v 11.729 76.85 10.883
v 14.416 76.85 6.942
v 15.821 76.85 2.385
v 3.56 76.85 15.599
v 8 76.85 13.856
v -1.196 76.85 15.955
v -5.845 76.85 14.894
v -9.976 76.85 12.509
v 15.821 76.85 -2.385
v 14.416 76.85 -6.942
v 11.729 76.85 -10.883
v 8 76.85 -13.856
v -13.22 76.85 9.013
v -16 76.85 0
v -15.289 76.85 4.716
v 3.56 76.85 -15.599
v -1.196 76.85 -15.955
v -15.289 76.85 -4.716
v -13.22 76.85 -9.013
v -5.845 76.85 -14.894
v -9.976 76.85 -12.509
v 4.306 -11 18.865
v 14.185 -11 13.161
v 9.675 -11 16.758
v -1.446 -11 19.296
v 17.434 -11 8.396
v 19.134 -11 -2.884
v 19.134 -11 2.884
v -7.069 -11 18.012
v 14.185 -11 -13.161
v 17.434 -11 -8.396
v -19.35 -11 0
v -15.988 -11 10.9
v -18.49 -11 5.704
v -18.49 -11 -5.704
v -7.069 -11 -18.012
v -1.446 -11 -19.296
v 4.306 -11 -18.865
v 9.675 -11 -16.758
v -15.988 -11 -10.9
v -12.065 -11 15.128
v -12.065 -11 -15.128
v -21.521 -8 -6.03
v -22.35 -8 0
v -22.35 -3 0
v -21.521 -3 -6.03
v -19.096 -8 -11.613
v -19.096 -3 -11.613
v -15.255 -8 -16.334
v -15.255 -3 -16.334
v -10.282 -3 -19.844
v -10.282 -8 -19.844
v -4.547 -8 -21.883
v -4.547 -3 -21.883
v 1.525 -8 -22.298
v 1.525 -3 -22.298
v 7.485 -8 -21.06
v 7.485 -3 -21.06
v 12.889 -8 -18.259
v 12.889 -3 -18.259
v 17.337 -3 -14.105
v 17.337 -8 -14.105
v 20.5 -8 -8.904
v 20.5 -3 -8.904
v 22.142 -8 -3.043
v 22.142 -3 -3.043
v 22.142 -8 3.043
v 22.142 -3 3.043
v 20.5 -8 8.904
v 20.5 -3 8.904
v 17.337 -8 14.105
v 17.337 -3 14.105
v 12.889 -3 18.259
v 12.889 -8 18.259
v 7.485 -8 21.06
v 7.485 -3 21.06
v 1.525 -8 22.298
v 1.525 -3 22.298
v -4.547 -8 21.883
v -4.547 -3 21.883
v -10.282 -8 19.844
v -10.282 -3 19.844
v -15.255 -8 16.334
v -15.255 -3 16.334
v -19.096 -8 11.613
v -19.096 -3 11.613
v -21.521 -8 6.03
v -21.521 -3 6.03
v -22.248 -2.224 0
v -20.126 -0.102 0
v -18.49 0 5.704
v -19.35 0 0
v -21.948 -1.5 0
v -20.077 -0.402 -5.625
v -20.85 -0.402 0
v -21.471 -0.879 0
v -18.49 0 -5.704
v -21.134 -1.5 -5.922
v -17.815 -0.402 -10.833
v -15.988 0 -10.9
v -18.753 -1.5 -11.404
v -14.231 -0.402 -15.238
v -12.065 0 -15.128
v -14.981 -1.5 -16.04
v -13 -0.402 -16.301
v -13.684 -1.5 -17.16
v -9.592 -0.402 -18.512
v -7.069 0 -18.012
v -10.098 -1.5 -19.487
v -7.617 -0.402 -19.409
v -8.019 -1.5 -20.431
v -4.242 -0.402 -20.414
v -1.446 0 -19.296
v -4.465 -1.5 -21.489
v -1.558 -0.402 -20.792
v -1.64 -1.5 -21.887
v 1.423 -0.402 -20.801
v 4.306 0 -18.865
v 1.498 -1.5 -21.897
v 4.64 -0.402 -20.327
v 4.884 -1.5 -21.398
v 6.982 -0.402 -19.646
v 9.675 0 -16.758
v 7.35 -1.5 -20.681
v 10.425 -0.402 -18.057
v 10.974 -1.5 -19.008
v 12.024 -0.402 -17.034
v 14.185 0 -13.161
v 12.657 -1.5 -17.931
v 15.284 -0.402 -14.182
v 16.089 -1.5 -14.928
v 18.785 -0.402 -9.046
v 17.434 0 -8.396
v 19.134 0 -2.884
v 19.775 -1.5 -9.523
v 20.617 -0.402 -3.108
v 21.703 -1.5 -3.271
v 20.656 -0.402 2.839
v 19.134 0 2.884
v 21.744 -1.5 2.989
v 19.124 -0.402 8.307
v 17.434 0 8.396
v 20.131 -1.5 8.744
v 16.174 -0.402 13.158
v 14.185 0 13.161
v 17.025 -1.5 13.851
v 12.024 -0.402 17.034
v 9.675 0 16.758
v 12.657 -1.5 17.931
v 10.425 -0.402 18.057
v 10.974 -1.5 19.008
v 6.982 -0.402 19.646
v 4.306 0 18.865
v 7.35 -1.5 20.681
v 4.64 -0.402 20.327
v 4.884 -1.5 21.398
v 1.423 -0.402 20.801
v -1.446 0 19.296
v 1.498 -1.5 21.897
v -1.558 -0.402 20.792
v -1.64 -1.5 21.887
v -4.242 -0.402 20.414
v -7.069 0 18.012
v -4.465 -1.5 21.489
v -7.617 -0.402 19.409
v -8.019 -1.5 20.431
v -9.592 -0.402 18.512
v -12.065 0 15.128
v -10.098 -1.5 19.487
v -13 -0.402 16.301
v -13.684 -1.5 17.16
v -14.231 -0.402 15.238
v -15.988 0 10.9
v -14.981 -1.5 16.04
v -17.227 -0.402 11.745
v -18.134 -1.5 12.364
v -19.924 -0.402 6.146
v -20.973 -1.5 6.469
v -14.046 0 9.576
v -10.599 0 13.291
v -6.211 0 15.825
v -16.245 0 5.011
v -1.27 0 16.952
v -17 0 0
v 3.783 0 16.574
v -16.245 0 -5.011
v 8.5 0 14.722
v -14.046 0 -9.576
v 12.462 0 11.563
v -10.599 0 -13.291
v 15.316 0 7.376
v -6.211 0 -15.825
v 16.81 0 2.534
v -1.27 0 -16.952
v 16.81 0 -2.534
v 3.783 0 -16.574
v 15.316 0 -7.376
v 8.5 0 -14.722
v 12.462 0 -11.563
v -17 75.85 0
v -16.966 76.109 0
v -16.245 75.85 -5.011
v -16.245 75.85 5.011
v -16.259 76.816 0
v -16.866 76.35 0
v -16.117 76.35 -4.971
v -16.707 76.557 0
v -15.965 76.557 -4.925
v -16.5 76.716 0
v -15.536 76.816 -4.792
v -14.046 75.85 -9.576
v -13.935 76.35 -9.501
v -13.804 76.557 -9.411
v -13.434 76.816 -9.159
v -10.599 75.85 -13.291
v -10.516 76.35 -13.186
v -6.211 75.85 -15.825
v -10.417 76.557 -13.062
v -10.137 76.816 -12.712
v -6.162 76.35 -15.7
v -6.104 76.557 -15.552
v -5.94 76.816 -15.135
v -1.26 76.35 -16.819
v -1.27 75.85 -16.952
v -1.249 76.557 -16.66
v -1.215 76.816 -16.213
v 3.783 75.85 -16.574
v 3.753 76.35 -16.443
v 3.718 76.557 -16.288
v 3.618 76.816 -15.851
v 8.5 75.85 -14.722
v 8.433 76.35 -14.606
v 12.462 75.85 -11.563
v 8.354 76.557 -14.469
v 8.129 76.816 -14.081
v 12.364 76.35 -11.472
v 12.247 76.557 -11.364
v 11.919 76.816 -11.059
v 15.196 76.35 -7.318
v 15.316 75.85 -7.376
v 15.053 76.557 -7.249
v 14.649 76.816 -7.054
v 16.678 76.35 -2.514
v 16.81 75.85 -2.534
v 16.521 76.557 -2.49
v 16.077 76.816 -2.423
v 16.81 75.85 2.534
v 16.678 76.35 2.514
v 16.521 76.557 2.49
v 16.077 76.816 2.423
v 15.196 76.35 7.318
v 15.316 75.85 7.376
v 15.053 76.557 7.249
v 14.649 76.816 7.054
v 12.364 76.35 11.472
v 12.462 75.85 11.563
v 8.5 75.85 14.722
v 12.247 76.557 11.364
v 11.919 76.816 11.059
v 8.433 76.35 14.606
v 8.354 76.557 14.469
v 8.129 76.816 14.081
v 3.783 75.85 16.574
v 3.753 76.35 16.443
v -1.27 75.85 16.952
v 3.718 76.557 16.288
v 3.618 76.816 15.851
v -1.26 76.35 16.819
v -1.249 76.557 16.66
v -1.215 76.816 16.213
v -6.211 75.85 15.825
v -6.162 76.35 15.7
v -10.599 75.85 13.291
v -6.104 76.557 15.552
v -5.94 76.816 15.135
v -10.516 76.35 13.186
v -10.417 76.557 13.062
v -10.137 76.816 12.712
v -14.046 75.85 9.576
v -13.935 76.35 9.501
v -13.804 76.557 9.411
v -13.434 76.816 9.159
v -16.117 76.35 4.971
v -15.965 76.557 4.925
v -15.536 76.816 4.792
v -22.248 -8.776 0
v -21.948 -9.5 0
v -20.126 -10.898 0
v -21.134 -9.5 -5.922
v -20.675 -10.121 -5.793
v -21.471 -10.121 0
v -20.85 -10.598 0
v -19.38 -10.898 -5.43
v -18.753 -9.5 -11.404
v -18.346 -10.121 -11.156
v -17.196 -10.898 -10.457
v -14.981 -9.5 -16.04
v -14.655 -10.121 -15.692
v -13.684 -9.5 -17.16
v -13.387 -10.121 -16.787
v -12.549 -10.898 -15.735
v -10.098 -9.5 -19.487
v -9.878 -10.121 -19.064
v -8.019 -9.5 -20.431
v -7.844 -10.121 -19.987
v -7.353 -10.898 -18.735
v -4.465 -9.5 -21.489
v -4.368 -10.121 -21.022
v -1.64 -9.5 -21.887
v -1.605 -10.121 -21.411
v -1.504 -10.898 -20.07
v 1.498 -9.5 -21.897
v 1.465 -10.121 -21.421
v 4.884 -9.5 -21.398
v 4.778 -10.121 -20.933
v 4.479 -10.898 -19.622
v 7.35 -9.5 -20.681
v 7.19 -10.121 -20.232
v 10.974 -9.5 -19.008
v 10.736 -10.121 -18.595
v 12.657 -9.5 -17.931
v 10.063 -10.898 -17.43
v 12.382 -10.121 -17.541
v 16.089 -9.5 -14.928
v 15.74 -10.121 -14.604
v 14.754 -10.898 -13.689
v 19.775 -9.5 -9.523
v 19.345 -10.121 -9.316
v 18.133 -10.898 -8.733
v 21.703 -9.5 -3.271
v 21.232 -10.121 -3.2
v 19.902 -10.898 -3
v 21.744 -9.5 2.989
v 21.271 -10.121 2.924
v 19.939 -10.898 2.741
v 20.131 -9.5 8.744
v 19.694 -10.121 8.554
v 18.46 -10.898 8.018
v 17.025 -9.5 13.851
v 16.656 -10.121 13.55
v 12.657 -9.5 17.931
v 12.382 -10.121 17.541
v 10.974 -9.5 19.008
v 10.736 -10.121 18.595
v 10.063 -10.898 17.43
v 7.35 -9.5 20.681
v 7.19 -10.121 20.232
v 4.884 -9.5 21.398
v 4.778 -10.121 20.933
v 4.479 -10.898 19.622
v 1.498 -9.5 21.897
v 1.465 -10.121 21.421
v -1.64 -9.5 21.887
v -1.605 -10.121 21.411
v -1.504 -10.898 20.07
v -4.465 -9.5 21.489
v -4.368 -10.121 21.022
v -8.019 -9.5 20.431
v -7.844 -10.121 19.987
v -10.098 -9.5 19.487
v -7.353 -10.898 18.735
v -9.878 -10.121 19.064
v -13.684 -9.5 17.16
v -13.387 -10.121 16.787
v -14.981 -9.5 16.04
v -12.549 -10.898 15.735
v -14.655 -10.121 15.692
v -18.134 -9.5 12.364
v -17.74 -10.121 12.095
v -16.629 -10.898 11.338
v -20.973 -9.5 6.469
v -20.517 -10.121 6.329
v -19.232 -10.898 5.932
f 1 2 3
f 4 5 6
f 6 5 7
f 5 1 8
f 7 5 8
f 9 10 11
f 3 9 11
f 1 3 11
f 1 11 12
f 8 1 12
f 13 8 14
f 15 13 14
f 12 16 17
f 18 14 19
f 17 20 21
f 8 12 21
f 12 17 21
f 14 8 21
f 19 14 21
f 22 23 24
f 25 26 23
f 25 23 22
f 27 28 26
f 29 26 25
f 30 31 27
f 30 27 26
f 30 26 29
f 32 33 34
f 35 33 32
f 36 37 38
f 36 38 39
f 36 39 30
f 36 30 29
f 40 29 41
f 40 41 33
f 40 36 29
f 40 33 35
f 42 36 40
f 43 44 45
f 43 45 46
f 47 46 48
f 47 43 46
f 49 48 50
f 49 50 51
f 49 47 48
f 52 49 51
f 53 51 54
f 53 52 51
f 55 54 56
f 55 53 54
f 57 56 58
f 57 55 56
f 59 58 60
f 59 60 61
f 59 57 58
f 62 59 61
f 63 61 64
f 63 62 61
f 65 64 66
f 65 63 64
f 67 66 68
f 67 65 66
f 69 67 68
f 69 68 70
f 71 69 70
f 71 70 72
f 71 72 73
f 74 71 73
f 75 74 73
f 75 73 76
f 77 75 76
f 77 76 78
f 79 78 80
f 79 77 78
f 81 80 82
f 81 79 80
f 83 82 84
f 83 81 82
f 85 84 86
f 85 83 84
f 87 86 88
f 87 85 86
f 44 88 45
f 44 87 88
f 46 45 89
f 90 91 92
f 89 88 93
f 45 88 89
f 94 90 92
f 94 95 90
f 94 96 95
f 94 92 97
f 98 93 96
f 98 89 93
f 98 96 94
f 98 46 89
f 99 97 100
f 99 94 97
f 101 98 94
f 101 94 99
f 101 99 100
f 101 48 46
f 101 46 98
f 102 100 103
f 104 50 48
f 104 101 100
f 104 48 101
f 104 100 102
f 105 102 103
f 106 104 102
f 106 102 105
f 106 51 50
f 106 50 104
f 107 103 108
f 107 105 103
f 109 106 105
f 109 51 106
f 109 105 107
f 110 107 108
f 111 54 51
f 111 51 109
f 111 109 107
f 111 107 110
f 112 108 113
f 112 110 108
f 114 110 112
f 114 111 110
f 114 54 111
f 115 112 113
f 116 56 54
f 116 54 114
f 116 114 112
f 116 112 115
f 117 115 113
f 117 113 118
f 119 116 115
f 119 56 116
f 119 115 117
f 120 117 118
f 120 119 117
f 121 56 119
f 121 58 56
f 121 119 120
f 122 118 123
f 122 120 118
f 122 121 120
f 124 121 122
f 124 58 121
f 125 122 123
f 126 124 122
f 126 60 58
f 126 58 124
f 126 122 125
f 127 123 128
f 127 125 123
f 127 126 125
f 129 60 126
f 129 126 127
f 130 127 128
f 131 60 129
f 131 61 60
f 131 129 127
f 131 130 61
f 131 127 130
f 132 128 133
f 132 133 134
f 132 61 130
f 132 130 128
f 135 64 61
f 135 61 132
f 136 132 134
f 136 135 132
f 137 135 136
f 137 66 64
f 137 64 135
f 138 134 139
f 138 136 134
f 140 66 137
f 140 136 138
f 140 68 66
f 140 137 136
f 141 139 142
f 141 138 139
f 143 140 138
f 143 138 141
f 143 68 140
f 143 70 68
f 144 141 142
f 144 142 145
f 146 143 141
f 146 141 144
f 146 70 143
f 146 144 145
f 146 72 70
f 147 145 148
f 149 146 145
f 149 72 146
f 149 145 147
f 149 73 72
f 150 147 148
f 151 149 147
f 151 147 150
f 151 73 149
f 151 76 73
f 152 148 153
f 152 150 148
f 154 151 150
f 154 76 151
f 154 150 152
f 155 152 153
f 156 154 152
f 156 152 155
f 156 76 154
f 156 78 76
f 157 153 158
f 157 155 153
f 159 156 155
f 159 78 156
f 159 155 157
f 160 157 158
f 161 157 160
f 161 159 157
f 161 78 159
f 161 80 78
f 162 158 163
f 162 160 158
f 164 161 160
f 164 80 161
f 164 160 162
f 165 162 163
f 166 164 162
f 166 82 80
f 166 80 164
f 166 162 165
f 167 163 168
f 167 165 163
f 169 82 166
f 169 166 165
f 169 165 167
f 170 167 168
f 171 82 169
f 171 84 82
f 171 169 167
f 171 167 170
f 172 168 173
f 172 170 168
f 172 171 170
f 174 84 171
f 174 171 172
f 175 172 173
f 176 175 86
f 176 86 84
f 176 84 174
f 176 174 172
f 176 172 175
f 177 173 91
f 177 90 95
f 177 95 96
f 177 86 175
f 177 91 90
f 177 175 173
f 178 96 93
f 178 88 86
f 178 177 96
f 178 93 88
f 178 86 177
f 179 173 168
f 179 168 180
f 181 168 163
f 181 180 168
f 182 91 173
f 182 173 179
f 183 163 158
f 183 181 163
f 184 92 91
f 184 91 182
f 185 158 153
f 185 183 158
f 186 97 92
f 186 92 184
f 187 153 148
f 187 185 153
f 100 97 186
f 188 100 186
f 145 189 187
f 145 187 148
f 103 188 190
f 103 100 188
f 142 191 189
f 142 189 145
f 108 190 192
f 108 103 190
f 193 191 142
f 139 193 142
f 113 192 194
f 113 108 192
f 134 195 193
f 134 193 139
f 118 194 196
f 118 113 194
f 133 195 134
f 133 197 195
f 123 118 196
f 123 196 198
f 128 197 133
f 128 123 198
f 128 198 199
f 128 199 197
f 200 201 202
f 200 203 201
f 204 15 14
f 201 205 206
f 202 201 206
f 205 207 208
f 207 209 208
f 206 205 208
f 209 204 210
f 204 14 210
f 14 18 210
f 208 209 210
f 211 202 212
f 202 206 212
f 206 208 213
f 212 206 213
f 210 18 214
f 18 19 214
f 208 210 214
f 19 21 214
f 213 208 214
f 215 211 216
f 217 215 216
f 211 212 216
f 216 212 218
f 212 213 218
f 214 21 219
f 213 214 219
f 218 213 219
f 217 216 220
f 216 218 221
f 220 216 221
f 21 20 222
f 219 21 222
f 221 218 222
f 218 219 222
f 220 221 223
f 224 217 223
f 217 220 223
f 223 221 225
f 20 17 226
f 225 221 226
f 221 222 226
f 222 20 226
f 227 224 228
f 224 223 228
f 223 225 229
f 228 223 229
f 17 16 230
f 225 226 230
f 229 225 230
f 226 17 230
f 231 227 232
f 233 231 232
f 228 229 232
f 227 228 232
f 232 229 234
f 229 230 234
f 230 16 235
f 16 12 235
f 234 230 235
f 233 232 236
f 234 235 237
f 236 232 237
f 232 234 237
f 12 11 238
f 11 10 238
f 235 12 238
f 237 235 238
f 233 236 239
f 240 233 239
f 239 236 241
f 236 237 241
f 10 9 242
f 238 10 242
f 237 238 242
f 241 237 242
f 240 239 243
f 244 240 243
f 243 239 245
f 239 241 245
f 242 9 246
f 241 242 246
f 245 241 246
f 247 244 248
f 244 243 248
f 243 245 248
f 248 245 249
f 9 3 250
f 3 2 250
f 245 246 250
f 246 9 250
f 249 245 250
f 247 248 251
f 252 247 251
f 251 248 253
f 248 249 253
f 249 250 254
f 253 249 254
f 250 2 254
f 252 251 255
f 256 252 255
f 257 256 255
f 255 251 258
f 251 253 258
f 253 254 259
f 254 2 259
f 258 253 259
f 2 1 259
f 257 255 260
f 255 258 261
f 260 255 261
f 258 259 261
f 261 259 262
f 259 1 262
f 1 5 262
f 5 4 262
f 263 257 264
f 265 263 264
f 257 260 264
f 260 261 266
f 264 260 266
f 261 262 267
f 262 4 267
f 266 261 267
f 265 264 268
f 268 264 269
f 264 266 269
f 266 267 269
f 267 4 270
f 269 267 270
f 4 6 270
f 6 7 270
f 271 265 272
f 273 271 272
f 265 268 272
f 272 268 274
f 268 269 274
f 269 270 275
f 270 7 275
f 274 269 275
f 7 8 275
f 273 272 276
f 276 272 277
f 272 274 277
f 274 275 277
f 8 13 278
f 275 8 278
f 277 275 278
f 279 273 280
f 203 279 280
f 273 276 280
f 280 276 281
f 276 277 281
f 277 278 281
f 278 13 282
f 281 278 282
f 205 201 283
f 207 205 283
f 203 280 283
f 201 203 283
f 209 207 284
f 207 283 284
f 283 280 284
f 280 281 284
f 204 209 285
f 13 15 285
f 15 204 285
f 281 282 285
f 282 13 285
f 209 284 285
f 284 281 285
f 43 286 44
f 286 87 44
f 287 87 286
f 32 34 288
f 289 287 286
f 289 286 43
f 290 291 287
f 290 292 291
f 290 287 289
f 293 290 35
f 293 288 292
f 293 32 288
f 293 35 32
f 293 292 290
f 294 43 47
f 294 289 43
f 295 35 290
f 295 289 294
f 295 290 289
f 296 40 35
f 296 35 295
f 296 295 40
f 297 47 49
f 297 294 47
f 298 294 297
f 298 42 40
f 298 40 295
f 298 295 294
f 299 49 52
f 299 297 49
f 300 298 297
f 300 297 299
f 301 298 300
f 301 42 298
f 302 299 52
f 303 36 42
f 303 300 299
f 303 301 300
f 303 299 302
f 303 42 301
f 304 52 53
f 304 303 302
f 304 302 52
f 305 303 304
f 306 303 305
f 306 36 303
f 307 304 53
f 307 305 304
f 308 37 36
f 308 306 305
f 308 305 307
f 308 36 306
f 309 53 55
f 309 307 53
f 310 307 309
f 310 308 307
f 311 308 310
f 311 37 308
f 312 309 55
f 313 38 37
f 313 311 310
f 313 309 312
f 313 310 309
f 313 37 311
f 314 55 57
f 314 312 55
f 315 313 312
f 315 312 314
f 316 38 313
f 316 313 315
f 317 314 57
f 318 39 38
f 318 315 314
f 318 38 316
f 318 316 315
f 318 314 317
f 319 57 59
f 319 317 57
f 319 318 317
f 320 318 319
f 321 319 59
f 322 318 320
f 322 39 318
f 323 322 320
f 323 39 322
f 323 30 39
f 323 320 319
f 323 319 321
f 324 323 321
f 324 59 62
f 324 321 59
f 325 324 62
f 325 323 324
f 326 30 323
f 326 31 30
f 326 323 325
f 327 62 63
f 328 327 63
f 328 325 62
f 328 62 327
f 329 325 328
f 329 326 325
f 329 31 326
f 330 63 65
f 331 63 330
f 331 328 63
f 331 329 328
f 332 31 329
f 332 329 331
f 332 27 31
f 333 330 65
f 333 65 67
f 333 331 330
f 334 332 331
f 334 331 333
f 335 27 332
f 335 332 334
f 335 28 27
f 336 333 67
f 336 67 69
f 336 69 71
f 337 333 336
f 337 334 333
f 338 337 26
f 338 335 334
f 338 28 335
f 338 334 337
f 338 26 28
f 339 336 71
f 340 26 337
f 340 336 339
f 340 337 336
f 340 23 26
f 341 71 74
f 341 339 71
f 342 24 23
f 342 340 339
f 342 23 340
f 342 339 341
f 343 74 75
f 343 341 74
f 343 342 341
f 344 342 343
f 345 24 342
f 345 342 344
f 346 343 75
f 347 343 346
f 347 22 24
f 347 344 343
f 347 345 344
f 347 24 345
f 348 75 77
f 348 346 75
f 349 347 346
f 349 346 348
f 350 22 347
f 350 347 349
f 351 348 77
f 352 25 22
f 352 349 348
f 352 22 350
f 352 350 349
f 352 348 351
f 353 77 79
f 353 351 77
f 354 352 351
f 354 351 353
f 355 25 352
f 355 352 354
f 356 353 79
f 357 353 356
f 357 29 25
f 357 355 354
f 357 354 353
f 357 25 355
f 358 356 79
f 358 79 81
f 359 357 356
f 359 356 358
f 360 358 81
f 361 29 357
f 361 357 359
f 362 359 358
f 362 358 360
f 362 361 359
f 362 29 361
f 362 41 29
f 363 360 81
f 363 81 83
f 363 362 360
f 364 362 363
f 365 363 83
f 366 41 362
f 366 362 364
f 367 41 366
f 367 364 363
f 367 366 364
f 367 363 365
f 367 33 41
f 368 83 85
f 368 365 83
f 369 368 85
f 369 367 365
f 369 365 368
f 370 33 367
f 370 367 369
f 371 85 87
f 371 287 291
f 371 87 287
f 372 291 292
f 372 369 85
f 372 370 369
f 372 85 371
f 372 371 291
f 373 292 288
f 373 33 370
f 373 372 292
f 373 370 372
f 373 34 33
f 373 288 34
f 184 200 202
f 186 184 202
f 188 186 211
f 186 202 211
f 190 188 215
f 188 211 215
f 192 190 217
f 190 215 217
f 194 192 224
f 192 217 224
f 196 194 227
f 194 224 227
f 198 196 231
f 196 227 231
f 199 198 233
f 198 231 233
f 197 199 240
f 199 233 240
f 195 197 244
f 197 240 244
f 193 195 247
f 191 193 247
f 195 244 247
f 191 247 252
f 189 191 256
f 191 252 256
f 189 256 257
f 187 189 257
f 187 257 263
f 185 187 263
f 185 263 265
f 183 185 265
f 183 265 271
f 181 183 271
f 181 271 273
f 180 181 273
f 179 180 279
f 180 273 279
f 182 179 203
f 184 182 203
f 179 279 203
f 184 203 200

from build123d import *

# Parameters (mm, degrees)
SKETCH_1_W = 17
SKETCH_1_H = 76.85
FILLET_1_R = 3
FILLET_2_R = 1


with BuildPart() as part:
    # 草图1 → 旋转1 (revolve)
    with BuildSketch(Plane.XY):
        with Locations((-8.5, 38.425)):
            Rectangle(SKETCH_1_W, SKETCH_1_H)
        Polygon((0, -11), (0, 0), (-17, 0), (-22.35, 0), (-22.35, -11), align=None)
    revolve(axis=Axis((0, 76.85, 0), (0, -1, 0)))

    # 圆角1
    fillet_1_edges = [part.edges().sort_by_distance(p)[0] for p in [
        (22.35, -11, 0),
        (22.35, 0, 0),
    ]]
    fillet(fillet_1_edges, radius=FILLET_1_R)

    # 圆角2
    fillet_2_edges = [part.edges().sort_by_distance(p)[0] for p in [
        (17, 76.85, 0),
    ]]
    fillet(fillet_2_edges, radius=FILLET_2_R)


solid = part.part
